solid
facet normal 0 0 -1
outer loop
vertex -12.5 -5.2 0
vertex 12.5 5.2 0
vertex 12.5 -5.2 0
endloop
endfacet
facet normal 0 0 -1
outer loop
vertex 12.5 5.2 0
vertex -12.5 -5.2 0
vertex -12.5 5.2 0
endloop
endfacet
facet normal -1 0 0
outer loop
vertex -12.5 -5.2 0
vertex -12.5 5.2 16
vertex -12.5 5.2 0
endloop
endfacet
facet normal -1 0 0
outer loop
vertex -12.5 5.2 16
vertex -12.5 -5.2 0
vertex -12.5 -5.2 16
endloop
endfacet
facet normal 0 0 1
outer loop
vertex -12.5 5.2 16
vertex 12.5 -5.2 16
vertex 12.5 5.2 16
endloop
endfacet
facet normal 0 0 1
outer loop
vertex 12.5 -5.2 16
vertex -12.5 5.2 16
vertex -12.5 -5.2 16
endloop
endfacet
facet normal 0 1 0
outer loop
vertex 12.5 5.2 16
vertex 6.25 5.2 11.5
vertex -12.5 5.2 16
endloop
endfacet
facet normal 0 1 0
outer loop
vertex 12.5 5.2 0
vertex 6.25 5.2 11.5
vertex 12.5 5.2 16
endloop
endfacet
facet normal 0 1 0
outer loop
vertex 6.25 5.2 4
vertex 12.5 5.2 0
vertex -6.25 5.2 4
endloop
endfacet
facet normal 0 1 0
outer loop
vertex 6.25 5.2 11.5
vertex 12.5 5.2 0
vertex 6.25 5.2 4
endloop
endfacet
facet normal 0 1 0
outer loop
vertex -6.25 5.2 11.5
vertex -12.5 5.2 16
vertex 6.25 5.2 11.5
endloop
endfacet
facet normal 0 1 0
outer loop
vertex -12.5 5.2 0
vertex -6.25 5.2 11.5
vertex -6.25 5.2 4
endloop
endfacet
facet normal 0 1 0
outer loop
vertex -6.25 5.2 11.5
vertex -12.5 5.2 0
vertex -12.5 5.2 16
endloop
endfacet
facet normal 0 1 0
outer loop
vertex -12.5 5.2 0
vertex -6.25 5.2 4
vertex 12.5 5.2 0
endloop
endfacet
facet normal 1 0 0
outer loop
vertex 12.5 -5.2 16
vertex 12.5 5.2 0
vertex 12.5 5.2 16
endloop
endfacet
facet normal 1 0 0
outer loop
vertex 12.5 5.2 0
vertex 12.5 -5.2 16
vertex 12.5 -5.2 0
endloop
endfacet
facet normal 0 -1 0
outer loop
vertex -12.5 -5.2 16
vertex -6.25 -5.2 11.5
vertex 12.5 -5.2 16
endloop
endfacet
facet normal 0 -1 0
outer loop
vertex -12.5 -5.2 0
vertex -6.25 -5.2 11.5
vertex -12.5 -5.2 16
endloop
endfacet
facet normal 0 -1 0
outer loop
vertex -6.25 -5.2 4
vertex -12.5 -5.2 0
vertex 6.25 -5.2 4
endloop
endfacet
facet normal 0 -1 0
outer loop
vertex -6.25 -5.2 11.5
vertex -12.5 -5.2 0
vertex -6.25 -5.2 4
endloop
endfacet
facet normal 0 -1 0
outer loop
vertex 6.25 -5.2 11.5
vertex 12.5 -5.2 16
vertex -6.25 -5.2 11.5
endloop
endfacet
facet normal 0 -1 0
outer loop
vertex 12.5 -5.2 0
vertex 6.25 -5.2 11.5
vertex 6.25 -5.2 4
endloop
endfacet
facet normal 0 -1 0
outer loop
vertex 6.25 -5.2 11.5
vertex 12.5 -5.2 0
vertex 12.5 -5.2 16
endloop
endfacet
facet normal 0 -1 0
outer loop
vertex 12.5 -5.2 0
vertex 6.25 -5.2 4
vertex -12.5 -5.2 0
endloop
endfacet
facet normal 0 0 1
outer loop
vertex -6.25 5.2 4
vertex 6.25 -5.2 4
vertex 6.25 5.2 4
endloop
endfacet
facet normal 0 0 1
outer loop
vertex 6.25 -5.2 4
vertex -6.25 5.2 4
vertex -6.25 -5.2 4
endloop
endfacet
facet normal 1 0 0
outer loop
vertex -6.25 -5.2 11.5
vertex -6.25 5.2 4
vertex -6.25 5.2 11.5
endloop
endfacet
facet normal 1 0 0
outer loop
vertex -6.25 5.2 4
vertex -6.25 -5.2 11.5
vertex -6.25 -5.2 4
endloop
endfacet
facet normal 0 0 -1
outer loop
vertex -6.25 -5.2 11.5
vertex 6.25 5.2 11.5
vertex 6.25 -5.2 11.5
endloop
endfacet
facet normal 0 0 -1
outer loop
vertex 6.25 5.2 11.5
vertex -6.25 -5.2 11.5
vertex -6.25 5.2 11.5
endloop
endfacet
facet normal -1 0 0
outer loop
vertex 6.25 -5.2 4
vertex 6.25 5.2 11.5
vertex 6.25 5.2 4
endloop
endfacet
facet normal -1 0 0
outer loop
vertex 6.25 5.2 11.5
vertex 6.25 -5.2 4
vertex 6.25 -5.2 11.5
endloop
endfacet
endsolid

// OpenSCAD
// Shape
width = 25;
height = 16;
length = 15.4 - 5;

// Hole
hole_width = 12.5;
hole_height = 7.5;


difference() {
    linear_extrude(height)
    square([width,length], center=true);
    
    translate([0,0,4])
    linear_extrude(hole_height)
    square([hole_width, length+1], center=true);
}
